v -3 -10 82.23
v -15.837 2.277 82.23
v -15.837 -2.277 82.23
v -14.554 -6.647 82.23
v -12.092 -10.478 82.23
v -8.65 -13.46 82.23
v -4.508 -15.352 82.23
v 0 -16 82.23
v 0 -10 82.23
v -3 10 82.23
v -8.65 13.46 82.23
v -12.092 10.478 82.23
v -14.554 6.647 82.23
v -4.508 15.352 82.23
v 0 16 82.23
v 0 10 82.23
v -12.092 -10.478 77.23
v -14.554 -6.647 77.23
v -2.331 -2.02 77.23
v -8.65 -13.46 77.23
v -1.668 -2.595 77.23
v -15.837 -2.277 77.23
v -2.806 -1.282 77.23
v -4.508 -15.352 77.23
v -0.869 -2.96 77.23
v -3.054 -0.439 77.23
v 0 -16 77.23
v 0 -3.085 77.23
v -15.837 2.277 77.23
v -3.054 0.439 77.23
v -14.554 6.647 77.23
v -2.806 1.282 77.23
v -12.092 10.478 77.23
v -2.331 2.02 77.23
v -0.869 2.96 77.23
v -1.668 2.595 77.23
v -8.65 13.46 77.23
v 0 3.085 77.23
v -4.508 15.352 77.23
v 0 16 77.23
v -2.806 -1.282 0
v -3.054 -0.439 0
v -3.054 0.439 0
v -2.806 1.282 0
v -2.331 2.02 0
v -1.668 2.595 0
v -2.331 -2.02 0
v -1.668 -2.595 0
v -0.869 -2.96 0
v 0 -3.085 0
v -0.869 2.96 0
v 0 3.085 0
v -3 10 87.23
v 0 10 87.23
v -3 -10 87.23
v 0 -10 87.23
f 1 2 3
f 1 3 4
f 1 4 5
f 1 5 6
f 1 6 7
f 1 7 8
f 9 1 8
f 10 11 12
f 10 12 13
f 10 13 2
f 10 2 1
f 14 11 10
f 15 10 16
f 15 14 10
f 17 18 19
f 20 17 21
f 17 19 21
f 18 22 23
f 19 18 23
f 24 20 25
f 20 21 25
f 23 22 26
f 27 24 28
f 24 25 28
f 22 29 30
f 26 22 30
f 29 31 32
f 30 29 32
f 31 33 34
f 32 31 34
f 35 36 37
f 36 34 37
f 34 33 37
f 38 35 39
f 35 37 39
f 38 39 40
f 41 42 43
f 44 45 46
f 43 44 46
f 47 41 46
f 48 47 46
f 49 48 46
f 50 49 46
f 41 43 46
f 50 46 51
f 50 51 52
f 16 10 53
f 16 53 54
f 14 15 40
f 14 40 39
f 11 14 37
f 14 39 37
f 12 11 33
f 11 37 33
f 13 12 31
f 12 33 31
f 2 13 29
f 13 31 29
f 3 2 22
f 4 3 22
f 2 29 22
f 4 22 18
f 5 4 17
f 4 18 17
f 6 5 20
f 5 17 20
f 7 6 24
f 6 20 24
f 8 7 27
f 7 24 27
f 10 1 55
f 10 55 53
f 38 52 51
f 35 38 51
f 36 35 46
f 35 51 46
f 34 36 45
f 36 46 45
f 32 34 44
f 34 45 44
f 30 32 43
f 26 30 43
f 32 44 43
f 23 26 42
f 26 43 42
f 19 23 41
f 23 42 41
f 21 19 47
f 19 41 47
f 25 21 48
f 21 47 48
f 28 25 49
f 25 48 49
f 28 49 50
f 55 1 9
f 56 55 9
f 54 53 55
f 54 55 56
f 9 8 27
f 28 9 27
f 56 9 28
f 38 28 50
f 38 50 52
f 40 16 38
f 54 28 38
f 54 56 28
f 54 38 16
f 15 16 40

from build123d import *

# Parameters (mm, degrees)
CROQUIS11_R             = 3.085
SALIENTE_EXTRUIR2_DEPTH = 77.23
CROQUIS12_R             = 16
SALIENTE_EXTRUIR3_DEPTH = 5
CROQUIS13_W             = 6
CROQUIS13_H             = 20
SALIENTE_EXTRUIR4_DEPTH = 5
CORTAR_EXTRUIR9_REACH   = 92.117
CROQUIS14_W             = 16
CROQUIS14_H             = 32


with BuildPart() as part:
    # Croquis11 → Saliente-Extruir2 (new body)
    with BuildSketch(Plane.XY):
        Circle(CROQUIS11_R)
    extrude(amount=SALIENTE_EXTRUIR2_DEPTH)

    # Croquis12 → Saliente-Extruir3 (add)
    with BuildSketch(Plane.XY.offset(77.23)):
        Circle(CROQUIS12_R)
    extrude(amount=SALIENTE_EXTRUIR3_DEPTH)

    # Croquis13 → Saliente-Extruir4 (add)
    with BuildSketch(Plane.XY.offset(82.23)):
        Rectangle(CROQUIS13_W, CROQUIS13_H)
    extrude(amount=SALIENTE_EXTRUIR4_DEPTH)

    # Cortar-Extruir9: up to this face of the body (flat: up to its plane)
    cortar_extruir9_end = Plane(part.part.faces().sort_by_distance((0, 0, 0))[0])
    # Croquis14 → Cortar-Extruir9 (cut, up to the picked face)
    with BuildSketch(Plane.XY.offset(87.23), mode=Mode.PRIVATE) as cortar_extruir9_sk1:
        with Locations((8, 0)):
            Rectangle(CROQUIS14_W, CROQUIS14_H)
    cortar_extruir9_tool1 = split(extrude(cortar_extruir9_sk1.sketch, amount=-CORTAR_EXTRUIR9_REACH, mode=Mode.PRIVATE), bisect_by=cortar_extruir9_end, keep=Keep.BOTH, mode=Mode.PRIVATE)
    add(cortar_extruir9_tool1.solids().sort_by(Axis((8, 0, 87.23), (0, 0, -1)))[0], mode=Mode.SUBTRACT)


solid = part.part
